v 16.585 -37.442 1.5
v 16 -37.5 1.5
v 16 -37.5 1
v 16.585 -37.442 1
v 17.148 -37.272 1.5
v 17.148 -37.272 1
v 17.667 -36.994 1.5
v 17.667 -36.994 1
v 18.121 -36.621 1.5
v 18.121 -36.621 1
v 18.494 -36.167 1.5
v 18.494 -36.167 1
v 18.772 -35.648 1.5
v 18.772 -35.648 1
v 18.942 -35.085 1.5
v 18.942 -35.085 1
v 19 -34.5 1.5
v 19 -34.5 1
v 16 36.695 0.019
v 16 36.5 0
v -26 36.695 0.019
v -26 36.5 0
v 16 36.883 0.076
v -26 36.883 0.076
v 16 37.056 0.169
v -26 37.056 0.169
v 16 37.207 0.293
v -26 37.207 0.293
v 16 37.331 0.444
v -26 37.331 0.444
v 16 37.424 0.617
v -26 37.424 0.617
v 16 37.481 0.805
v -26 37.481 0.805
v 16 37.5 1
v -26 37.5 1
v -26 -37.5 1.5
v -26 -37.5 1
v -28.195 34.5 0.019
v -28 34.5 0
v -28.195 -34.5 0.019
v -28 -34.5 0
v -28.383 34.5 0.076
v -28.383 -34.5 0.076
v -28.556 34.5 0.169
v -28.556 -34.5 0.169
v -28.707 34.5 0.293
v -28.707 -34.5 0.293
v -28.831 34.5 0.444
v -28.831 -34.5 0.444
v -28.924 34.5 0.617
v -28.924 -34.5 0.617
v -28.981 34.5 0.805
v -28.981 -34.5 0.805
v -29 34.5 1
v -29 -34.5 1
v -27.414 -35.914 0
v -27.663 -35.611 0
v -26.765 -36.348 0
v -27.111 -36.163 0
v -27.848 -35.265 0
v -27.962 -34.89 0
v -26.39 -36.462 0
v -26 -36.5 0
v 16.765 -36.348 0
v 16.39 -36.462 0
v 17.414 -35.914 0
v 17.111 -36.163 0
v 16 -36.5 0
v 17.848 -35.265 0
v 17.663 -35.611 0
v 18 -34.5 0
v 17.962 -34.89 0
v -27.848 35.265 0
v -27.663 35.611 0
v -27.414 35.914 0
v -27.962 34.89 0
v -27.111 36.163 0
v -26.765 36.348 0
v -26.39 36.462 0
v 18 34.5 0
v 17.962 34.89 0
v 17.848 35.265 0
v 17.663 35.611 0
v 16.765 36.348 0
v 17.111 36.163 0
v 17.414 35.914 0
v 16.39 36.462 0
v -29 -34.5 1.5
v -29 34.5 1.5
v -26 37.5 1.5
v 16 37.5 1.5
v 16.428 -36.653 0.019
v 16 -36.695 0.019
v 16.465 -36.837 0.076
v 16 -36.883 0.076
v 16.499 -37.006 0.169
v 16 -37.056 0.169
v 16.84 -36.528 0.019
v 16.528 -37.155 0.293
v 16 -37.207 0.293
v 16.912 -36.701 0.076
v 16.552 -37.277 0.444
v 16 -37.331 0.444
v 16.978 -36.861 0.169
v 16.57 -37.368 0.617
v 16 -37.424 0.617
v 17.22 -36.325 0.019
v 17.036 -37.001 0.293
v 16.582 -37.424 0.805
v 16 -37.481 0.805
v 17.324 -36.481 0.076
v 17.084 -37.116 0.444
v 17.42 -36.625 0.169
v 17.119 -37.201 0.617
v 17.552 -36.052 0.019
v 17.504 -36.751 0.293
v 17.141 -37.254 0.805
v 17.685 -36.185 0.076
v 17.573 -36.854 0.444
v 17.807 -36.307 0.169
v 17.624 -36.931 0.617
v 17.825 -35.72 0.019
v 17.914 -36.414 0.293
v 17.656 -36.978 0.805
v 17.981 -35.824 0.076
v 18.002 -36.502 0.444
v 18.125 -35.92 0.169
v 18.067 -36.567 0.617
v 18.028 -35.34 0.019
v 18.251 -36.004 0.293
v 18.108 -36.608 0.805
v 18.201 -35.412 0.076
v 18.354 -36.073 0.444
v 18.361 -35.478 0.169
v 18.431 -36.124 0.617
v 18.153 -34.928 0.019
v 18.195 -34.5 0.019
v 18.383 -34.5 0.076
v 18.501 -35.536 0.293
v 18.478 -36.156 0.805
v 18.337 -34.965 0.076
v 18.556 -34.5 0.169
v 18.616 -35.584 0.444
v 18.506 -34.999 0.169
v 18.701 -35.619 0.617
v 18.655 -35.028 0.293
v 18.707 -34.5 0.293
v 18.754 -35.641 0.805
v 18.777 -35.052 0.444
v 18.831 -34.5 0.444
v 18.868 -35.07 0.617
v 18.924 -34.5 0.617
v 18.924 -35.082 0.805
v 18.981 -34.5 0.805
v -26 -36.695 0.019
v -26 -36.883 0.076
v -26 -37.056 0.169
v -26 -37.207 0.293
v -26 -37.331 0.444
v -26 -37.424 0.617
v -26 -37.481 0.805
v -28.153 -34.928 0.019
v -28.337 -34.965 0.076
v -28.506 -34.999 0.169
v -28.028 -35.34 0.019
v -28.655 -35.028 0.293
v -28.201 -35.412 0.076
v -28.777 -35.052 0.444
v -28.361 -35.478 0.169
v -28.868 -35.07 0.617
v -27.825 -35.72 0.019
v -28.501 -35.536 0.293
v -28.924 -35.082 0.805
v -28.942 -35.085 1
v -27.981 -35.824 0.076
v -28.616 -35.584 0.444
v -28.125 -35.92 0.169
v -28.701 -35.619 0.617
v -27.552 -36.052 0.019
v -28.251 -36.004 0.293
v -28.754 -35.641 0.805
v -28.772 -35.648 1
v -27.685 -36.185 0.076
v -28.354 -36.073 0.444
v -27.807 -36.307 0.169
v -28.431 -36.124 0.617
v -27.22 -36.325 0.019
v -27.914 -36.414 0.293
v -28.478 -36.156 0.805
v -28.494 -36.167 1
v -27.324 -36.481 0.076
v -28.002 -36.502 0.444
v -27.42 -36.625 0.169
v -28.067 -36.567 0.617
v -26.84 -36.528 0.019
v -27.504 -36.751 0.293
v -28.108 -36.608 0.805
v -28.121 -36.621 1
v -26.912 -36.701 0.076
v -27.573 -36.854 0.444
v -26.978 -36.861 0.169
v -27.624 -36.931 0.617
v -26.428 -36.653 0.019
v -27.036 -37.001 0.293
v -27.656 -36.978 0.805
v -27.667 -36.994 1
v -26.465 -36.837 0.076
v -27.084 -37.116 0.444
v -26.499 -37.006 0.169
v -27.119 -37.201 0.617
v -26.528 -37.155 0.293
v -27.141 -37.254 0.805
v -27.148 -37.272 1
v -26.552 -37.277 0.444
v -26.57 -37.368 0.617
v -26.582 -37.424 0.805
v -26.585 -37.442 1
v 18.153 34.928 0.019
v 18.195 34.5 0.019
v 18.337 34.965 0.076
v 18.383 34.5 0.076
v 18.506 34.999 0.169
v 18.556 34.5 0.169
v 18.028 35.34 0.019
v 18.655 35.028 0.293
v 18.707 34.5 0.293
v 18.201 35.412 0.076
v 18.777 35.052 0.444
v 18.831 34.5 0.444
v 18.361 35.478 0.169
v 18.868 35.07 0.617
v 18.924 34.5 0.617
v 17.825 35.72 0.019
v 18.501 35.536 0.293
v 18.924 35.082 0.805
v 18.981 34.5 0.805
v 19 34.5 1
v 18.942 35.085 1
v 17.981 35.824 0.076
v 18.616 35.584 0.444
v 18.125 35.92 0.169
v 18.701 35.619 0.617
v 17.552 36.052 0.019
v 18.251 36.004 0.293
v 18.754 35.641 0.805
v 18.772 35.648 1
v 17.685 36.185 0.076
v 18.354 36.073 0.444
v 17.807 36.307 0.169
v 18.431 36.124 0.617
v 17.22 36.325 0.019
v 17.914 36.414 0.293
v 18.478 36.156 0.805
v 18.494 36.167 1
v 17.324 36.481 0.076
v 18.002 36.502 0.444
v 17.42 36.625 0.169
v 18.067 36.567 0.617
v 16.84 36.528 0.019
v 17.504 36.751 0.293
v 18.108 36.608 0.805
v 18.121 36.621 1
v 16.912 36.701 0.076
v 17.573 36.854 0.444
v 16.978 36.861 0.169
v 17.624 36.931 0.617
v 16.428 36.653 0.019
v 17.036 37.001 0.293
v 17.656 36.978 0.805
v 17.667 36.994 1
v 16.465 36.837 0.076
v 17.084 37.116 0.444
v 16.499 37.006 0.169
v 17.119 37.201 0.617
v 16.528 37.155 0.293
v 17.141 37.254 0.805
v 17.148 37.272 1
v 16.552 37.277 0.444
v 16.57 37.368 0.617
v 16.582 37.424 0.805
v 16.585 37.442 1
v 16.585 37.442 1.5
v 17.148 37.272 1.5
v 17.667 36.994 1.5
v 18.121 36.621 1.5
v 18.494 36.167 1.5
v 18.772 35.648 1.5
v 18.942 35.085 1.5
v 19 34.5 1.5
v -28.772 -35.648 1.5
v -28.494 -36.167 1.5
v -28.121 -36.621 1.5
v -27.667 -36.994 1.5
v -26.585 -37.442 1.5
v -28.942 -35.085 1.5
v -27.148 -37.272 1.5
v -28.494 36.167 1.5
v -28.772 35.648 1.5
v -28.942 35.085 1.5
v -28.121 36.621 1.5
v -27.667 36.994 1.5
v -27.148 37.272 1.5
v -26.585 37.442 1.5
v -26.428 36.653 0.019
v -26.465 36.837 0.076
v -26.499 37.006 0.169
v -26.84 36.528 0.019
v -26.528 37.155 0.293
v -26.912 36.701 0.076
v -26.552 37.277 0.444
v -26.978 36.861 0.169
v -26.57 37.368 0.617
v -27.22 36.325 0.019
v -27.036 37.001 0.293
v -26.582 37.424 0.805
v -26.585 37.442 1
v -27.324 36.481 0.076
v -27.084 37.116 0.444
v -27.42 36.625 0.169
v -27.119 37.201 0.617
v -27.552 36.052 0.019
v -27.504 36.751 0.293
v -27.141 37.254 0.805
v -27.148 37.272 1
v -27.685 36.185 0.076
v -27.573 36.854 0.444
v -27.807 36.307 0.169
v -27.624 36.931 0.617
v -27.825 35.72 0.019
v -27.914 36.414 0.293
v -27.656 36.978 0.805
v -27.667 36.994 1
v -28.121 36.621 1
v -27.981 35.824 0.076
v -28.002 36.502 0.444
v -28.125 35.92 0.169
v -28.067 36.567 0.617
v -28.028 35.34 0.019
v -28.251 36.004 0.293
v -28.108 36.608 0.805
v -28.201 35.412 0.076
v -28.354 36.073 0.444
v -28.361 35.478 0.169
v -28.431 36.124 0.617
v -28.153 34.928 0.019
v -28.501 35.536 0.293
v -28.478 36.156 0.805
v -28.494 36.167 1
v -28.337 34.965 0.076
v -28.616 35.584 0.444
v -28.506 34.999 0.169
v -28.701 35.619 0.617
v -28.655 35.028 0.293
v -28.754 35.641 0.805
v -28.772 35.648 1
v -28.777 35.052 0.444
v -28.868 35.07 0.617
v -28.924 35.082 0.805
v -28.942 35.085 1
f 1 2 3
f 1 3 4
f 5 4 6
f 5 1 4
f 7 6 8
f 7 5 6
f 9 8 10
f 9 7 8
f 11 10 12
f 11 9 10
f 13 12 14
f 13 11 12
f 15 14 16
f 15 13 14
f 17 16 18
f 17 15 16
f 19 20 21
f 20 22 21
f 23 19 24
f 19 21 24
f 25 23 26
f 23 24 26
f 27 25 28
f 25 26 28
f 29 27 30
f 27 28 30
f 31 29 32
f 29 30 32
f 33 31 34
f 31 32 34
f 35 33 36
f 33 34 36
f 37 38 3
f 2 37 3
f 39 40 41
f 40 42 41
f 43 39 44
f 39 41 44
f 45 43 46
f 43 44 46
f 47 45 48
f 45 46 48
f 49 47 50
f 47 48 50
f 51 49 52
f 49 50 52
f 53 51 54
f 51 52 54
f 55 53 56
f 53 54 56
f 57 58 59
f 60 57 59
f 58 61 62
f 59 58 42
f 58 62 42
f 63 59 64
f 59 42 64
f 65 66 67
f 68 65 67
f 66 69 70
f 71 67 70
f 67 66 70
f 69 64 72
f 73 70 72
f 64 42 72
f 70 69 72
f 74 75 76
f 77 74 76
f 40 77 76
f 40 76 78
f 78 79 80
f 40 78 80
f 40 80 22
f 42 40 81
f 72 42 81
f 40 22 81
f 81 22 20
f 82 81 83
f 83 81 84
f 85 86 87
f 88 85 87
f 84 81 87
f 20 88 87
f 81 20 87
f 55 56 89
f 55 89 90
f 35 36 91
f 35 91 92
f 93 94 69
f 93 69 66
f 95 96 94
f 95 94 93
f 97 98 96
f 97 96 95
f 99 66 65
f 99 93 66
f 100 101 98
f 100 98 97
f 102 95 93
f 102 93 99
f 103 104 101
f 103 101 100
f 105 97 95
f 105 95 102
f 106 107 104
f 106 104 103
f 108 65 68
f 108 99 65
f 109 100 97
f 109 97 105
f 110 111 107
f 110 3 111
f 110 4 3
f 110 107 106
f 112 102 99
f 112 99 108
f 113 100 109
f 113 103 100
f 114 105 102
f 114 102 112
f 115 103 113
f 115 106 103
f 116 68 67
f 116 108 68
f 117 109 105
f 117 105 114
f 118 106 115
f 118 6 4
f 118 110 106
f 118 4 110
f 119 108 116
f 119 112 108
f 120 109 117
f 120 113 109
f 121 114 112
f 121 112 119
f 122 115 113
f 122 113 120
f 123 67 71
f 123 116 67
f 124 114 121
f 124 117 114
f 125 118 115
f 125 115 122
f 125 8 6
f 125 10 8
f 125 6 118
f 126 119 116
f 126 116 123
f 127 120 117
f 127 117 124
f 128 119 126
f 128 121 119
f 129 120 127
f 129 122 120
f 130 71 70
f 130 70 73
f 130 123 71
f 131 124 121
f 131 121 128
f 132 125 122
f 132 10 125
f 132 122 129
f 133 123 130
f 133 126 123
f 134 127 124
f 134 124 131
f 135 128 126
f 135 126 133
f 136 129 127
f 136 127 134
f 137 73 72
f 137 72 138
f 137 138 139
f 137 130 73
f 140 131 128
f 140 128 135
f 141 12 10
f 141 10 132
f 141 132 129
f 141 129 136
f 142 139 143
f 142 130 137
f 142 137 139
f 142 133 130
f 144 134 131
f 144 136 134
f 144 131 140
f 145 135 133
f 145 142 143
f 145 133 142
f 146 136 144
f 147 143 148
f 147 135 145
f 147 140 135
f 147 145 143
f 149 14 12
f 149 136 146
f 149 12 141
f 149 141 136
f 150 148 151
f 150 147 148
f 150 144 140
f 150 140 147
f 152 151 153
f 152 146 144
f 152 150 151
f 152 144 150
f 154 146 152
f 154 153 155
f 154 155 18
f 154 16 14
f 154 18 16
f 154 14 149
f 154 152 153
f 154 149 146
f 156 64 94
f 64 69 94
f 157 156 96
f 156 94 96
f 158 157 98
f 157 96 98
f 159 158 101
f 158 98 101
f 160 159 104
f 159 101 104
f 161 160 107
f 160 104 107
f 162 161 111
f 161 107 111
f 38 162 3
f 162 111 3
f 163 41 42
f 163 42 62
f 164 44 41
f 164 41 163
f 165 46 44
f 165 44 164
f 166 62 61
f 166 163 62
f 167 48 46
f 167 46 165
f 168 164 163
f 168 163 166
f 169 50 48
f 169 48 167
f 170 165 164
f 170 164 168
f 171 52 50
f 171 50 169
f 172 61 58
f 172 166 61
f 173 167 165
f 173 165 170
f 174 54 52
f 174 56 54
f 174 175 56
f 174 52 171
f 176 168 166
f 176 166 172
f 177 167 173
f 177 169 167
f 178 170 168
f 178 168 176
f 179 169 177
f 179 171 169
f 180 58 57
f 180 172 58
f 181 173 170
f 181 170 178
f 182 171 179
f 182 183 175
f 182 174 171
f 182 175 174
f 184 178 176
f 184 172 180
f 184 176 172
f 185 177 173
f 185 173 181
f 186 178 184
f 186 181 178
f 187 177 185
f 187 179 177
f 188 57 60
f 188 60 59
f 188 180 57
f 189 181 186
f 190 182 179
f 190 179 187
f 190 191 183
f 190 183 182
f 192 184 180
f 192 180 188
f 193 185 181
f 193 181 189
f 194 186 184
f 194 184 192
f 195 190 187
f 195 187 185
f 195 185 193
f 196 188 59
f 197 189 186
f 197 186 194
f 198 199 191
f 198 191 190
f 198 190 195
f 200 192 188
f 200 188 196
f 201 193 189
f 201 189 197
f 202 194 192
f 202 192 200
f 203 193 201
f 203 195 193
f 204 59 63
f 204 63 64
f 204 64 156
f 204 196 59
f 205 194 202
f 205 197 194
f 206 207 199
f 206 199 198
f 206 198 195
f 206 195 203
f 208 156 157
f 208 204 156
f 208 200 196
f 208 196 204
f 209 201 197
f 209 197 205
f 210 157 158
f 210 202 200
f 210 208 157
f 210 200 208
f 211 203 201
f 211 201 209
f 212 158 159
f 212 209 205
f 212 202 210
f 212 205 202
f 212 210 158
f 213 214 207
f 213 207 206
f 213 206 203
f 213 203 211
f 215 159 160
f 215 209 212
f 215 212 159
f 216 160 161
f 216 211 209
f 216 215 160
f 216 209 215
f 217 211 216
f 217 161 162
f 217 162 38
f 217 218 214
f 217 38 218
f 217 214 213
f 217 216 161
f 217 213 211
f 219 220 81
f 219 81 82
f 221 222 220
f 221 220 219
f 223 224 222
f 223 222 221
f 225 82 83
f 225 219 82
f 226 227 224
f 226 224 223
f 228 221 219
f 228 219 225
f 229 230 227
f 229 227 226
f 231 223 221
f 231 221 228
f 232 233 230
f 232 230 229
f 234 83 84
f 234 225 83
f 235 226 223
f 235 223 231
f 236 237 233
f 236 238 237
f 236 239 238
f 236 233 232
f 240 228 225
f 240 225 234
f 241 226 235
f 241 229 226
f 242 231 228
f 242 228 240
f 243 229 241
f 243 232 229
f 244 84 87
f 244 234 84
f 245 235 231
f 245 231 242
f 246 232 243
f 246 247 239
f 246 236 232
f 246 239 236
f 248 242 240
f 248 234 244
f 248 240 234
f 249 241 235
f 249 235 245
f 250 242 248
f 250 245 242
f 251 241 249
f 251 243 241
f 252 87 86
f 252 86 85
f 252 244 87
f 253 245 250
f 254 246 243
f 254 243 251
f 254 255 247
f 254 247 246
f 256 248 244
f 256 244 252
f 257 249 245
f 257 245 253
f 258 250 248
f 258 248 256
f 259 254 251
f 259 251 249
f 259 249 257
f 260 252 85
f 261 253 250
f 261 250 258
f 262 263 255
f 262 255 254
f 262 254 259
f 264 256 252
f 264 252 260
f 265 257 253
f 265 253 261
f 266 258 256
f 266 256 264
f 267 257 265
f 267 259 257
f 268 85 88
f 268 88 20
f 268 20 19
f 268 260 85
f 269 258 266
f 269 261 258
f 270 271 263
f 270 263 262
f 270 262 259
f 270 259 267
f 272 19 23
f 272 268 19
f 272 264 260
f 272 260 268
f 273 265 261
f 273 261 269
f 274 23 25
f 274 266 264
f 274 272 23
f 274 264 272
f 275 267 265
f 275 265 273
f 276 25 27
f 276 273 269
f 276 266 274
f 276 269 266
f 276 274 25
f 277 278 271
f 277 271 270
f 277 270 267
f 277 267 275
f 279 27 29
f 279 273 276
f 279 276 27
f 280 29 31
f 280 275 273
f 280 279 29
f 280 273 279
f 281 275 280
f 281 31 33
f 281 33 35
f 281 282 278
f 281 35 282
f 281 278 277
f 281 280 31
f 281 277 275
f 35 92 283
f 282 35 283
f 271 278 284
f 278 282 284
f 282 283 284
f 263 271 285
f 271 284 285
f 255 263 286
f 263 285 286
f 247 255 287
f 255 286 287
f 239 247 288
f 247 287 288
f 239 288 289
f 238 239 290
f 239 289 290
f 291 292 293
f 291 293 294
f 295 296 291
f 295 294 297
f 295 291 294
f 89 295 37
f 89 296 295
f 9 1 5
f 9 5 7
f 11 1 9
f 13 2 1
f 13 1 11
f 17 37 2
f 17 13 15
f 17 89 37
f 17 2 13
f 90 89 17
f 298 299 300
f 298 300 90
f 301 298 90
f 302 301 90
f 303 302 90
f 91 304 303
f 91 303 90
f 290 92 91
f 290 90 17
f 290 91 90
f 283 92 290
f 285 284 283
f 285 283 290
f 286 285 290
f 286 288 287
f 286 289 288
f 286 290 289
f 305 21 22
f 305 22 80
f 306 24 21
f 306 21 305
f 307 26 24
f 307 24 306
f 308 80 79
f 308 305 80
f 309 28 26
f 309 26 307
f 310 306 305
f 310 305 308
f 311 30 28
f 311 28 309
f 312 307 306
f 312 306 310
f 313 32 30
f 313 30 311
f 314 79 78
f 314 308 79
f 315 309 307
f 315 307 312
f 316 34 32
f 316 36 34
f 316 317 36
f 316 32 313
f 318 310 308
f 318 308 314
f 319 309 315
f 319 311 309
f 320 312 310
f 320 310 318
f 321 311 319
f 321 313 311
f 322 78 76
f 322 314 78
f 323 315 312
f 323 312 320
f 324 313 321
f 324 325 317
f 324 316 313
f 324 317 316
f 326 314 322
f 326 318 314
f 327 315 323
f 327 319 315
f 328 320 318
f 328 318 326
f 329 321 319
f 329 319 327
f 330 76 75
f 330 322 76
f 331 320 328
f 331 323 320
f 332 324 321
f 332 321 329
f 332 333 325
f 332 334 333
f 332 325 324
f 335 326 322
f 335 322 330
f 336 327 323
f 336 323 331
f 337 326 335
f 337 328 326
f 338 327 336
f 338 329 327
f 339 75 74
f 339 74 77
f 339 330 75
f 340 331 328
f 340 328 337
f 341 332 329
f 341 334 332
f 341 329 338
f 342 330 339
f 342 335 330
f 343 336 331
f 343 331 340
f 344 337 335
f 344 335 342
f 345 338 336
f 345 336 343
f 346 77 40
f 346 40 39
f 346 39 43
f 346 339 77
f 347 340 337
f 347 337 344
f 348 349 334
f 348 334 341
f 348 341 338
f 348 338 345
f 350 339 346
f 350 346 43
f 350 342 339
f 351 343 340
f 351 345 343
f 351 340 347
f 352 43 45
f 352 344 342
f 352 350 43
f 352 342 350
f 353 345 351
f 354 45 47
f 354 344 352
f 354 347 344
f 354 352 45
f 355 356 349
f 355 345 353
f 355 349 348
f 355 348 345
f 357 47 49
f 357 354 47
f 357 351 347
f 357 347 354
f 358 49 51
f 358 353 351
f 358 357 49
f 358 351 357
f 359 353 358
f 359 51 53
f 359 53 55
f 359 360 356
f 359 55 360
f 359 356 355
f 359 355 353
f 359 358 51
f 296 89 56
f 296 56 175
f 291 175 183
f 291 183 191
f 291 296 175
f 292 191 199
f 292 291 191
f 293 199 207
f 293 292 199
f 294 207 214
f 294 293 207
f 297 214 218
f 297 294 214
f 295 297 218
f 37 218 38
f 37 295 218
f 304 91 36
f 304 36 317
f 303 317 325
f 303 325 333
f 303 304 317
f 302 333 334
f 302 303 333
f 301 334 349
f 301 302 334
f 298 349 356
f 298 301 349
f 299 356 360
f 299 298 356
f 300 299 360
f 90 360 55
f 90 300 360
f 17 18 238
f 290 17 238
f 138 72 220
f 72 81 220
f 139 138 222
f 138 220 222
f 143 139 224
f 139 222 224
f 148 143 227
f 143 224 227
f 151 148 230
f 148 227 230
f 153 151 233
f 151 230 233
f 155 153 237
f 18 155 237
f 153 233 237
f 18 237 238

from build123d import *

# Parameters (mm, degrees)
SKETCH_W    = 48
SKETCH_H    = 75
PAD_DEPTH   = 1.5
FILLET006_R = 3
FILLET007_R = 3
FILLET008_R = 3
FILLET009_R = 1


with BuildPart() as part:
    # Sketch → Pad (new body)
    with BuildSketch(Plane.XY):
        with Locations((-5, 0)):
            Rectangle(SKETCH_W, SKETCH_H)
    extrude(amount=PAD_DEPTH)

    # Fillet006
    fillet006_edges = [part.edges().sort_by_distance(p)[0] for p in [
        (-29, -37.5, 0.75),
    ]]
    fillet(fillet006_edges, radius=FILLET006_R)

    # Fillet007
    fillet007_edges = [part.edges().sort_by_distance(p)[0] for p in [
        (19, -37.5, 0.75),
        (19, 37.5, 0.75),
    ]]
    fillet(fillet007_edges, radius=FILLET007_R)

    # Fillet008
    fillet008_edges = [part.edges().sort_by_distance(p)[0] for p in [
        (-29, 37.5, 0.75),
    ]]
    fillet(fillet008_edges, radius=FILLET008_R)

    # Fillet009
    fillet009_edges = [part.edges().sort_by_distance(p)[0] for p in [
        (19, 0, 0),
        (18.12132, -36.62132, 0),
        (-5, -37.5, 0),
        (-28.12132, -36.62132, 0),
        (-29, 0, 0),
        (-28.12132, 36.62132, 0),
        (-5, 37.5, 0),
        (18.12132, 36.62132, 0),
    ]]
    fillet(fillet009_edges, radius=FILLET009_R)


solid = part.part
